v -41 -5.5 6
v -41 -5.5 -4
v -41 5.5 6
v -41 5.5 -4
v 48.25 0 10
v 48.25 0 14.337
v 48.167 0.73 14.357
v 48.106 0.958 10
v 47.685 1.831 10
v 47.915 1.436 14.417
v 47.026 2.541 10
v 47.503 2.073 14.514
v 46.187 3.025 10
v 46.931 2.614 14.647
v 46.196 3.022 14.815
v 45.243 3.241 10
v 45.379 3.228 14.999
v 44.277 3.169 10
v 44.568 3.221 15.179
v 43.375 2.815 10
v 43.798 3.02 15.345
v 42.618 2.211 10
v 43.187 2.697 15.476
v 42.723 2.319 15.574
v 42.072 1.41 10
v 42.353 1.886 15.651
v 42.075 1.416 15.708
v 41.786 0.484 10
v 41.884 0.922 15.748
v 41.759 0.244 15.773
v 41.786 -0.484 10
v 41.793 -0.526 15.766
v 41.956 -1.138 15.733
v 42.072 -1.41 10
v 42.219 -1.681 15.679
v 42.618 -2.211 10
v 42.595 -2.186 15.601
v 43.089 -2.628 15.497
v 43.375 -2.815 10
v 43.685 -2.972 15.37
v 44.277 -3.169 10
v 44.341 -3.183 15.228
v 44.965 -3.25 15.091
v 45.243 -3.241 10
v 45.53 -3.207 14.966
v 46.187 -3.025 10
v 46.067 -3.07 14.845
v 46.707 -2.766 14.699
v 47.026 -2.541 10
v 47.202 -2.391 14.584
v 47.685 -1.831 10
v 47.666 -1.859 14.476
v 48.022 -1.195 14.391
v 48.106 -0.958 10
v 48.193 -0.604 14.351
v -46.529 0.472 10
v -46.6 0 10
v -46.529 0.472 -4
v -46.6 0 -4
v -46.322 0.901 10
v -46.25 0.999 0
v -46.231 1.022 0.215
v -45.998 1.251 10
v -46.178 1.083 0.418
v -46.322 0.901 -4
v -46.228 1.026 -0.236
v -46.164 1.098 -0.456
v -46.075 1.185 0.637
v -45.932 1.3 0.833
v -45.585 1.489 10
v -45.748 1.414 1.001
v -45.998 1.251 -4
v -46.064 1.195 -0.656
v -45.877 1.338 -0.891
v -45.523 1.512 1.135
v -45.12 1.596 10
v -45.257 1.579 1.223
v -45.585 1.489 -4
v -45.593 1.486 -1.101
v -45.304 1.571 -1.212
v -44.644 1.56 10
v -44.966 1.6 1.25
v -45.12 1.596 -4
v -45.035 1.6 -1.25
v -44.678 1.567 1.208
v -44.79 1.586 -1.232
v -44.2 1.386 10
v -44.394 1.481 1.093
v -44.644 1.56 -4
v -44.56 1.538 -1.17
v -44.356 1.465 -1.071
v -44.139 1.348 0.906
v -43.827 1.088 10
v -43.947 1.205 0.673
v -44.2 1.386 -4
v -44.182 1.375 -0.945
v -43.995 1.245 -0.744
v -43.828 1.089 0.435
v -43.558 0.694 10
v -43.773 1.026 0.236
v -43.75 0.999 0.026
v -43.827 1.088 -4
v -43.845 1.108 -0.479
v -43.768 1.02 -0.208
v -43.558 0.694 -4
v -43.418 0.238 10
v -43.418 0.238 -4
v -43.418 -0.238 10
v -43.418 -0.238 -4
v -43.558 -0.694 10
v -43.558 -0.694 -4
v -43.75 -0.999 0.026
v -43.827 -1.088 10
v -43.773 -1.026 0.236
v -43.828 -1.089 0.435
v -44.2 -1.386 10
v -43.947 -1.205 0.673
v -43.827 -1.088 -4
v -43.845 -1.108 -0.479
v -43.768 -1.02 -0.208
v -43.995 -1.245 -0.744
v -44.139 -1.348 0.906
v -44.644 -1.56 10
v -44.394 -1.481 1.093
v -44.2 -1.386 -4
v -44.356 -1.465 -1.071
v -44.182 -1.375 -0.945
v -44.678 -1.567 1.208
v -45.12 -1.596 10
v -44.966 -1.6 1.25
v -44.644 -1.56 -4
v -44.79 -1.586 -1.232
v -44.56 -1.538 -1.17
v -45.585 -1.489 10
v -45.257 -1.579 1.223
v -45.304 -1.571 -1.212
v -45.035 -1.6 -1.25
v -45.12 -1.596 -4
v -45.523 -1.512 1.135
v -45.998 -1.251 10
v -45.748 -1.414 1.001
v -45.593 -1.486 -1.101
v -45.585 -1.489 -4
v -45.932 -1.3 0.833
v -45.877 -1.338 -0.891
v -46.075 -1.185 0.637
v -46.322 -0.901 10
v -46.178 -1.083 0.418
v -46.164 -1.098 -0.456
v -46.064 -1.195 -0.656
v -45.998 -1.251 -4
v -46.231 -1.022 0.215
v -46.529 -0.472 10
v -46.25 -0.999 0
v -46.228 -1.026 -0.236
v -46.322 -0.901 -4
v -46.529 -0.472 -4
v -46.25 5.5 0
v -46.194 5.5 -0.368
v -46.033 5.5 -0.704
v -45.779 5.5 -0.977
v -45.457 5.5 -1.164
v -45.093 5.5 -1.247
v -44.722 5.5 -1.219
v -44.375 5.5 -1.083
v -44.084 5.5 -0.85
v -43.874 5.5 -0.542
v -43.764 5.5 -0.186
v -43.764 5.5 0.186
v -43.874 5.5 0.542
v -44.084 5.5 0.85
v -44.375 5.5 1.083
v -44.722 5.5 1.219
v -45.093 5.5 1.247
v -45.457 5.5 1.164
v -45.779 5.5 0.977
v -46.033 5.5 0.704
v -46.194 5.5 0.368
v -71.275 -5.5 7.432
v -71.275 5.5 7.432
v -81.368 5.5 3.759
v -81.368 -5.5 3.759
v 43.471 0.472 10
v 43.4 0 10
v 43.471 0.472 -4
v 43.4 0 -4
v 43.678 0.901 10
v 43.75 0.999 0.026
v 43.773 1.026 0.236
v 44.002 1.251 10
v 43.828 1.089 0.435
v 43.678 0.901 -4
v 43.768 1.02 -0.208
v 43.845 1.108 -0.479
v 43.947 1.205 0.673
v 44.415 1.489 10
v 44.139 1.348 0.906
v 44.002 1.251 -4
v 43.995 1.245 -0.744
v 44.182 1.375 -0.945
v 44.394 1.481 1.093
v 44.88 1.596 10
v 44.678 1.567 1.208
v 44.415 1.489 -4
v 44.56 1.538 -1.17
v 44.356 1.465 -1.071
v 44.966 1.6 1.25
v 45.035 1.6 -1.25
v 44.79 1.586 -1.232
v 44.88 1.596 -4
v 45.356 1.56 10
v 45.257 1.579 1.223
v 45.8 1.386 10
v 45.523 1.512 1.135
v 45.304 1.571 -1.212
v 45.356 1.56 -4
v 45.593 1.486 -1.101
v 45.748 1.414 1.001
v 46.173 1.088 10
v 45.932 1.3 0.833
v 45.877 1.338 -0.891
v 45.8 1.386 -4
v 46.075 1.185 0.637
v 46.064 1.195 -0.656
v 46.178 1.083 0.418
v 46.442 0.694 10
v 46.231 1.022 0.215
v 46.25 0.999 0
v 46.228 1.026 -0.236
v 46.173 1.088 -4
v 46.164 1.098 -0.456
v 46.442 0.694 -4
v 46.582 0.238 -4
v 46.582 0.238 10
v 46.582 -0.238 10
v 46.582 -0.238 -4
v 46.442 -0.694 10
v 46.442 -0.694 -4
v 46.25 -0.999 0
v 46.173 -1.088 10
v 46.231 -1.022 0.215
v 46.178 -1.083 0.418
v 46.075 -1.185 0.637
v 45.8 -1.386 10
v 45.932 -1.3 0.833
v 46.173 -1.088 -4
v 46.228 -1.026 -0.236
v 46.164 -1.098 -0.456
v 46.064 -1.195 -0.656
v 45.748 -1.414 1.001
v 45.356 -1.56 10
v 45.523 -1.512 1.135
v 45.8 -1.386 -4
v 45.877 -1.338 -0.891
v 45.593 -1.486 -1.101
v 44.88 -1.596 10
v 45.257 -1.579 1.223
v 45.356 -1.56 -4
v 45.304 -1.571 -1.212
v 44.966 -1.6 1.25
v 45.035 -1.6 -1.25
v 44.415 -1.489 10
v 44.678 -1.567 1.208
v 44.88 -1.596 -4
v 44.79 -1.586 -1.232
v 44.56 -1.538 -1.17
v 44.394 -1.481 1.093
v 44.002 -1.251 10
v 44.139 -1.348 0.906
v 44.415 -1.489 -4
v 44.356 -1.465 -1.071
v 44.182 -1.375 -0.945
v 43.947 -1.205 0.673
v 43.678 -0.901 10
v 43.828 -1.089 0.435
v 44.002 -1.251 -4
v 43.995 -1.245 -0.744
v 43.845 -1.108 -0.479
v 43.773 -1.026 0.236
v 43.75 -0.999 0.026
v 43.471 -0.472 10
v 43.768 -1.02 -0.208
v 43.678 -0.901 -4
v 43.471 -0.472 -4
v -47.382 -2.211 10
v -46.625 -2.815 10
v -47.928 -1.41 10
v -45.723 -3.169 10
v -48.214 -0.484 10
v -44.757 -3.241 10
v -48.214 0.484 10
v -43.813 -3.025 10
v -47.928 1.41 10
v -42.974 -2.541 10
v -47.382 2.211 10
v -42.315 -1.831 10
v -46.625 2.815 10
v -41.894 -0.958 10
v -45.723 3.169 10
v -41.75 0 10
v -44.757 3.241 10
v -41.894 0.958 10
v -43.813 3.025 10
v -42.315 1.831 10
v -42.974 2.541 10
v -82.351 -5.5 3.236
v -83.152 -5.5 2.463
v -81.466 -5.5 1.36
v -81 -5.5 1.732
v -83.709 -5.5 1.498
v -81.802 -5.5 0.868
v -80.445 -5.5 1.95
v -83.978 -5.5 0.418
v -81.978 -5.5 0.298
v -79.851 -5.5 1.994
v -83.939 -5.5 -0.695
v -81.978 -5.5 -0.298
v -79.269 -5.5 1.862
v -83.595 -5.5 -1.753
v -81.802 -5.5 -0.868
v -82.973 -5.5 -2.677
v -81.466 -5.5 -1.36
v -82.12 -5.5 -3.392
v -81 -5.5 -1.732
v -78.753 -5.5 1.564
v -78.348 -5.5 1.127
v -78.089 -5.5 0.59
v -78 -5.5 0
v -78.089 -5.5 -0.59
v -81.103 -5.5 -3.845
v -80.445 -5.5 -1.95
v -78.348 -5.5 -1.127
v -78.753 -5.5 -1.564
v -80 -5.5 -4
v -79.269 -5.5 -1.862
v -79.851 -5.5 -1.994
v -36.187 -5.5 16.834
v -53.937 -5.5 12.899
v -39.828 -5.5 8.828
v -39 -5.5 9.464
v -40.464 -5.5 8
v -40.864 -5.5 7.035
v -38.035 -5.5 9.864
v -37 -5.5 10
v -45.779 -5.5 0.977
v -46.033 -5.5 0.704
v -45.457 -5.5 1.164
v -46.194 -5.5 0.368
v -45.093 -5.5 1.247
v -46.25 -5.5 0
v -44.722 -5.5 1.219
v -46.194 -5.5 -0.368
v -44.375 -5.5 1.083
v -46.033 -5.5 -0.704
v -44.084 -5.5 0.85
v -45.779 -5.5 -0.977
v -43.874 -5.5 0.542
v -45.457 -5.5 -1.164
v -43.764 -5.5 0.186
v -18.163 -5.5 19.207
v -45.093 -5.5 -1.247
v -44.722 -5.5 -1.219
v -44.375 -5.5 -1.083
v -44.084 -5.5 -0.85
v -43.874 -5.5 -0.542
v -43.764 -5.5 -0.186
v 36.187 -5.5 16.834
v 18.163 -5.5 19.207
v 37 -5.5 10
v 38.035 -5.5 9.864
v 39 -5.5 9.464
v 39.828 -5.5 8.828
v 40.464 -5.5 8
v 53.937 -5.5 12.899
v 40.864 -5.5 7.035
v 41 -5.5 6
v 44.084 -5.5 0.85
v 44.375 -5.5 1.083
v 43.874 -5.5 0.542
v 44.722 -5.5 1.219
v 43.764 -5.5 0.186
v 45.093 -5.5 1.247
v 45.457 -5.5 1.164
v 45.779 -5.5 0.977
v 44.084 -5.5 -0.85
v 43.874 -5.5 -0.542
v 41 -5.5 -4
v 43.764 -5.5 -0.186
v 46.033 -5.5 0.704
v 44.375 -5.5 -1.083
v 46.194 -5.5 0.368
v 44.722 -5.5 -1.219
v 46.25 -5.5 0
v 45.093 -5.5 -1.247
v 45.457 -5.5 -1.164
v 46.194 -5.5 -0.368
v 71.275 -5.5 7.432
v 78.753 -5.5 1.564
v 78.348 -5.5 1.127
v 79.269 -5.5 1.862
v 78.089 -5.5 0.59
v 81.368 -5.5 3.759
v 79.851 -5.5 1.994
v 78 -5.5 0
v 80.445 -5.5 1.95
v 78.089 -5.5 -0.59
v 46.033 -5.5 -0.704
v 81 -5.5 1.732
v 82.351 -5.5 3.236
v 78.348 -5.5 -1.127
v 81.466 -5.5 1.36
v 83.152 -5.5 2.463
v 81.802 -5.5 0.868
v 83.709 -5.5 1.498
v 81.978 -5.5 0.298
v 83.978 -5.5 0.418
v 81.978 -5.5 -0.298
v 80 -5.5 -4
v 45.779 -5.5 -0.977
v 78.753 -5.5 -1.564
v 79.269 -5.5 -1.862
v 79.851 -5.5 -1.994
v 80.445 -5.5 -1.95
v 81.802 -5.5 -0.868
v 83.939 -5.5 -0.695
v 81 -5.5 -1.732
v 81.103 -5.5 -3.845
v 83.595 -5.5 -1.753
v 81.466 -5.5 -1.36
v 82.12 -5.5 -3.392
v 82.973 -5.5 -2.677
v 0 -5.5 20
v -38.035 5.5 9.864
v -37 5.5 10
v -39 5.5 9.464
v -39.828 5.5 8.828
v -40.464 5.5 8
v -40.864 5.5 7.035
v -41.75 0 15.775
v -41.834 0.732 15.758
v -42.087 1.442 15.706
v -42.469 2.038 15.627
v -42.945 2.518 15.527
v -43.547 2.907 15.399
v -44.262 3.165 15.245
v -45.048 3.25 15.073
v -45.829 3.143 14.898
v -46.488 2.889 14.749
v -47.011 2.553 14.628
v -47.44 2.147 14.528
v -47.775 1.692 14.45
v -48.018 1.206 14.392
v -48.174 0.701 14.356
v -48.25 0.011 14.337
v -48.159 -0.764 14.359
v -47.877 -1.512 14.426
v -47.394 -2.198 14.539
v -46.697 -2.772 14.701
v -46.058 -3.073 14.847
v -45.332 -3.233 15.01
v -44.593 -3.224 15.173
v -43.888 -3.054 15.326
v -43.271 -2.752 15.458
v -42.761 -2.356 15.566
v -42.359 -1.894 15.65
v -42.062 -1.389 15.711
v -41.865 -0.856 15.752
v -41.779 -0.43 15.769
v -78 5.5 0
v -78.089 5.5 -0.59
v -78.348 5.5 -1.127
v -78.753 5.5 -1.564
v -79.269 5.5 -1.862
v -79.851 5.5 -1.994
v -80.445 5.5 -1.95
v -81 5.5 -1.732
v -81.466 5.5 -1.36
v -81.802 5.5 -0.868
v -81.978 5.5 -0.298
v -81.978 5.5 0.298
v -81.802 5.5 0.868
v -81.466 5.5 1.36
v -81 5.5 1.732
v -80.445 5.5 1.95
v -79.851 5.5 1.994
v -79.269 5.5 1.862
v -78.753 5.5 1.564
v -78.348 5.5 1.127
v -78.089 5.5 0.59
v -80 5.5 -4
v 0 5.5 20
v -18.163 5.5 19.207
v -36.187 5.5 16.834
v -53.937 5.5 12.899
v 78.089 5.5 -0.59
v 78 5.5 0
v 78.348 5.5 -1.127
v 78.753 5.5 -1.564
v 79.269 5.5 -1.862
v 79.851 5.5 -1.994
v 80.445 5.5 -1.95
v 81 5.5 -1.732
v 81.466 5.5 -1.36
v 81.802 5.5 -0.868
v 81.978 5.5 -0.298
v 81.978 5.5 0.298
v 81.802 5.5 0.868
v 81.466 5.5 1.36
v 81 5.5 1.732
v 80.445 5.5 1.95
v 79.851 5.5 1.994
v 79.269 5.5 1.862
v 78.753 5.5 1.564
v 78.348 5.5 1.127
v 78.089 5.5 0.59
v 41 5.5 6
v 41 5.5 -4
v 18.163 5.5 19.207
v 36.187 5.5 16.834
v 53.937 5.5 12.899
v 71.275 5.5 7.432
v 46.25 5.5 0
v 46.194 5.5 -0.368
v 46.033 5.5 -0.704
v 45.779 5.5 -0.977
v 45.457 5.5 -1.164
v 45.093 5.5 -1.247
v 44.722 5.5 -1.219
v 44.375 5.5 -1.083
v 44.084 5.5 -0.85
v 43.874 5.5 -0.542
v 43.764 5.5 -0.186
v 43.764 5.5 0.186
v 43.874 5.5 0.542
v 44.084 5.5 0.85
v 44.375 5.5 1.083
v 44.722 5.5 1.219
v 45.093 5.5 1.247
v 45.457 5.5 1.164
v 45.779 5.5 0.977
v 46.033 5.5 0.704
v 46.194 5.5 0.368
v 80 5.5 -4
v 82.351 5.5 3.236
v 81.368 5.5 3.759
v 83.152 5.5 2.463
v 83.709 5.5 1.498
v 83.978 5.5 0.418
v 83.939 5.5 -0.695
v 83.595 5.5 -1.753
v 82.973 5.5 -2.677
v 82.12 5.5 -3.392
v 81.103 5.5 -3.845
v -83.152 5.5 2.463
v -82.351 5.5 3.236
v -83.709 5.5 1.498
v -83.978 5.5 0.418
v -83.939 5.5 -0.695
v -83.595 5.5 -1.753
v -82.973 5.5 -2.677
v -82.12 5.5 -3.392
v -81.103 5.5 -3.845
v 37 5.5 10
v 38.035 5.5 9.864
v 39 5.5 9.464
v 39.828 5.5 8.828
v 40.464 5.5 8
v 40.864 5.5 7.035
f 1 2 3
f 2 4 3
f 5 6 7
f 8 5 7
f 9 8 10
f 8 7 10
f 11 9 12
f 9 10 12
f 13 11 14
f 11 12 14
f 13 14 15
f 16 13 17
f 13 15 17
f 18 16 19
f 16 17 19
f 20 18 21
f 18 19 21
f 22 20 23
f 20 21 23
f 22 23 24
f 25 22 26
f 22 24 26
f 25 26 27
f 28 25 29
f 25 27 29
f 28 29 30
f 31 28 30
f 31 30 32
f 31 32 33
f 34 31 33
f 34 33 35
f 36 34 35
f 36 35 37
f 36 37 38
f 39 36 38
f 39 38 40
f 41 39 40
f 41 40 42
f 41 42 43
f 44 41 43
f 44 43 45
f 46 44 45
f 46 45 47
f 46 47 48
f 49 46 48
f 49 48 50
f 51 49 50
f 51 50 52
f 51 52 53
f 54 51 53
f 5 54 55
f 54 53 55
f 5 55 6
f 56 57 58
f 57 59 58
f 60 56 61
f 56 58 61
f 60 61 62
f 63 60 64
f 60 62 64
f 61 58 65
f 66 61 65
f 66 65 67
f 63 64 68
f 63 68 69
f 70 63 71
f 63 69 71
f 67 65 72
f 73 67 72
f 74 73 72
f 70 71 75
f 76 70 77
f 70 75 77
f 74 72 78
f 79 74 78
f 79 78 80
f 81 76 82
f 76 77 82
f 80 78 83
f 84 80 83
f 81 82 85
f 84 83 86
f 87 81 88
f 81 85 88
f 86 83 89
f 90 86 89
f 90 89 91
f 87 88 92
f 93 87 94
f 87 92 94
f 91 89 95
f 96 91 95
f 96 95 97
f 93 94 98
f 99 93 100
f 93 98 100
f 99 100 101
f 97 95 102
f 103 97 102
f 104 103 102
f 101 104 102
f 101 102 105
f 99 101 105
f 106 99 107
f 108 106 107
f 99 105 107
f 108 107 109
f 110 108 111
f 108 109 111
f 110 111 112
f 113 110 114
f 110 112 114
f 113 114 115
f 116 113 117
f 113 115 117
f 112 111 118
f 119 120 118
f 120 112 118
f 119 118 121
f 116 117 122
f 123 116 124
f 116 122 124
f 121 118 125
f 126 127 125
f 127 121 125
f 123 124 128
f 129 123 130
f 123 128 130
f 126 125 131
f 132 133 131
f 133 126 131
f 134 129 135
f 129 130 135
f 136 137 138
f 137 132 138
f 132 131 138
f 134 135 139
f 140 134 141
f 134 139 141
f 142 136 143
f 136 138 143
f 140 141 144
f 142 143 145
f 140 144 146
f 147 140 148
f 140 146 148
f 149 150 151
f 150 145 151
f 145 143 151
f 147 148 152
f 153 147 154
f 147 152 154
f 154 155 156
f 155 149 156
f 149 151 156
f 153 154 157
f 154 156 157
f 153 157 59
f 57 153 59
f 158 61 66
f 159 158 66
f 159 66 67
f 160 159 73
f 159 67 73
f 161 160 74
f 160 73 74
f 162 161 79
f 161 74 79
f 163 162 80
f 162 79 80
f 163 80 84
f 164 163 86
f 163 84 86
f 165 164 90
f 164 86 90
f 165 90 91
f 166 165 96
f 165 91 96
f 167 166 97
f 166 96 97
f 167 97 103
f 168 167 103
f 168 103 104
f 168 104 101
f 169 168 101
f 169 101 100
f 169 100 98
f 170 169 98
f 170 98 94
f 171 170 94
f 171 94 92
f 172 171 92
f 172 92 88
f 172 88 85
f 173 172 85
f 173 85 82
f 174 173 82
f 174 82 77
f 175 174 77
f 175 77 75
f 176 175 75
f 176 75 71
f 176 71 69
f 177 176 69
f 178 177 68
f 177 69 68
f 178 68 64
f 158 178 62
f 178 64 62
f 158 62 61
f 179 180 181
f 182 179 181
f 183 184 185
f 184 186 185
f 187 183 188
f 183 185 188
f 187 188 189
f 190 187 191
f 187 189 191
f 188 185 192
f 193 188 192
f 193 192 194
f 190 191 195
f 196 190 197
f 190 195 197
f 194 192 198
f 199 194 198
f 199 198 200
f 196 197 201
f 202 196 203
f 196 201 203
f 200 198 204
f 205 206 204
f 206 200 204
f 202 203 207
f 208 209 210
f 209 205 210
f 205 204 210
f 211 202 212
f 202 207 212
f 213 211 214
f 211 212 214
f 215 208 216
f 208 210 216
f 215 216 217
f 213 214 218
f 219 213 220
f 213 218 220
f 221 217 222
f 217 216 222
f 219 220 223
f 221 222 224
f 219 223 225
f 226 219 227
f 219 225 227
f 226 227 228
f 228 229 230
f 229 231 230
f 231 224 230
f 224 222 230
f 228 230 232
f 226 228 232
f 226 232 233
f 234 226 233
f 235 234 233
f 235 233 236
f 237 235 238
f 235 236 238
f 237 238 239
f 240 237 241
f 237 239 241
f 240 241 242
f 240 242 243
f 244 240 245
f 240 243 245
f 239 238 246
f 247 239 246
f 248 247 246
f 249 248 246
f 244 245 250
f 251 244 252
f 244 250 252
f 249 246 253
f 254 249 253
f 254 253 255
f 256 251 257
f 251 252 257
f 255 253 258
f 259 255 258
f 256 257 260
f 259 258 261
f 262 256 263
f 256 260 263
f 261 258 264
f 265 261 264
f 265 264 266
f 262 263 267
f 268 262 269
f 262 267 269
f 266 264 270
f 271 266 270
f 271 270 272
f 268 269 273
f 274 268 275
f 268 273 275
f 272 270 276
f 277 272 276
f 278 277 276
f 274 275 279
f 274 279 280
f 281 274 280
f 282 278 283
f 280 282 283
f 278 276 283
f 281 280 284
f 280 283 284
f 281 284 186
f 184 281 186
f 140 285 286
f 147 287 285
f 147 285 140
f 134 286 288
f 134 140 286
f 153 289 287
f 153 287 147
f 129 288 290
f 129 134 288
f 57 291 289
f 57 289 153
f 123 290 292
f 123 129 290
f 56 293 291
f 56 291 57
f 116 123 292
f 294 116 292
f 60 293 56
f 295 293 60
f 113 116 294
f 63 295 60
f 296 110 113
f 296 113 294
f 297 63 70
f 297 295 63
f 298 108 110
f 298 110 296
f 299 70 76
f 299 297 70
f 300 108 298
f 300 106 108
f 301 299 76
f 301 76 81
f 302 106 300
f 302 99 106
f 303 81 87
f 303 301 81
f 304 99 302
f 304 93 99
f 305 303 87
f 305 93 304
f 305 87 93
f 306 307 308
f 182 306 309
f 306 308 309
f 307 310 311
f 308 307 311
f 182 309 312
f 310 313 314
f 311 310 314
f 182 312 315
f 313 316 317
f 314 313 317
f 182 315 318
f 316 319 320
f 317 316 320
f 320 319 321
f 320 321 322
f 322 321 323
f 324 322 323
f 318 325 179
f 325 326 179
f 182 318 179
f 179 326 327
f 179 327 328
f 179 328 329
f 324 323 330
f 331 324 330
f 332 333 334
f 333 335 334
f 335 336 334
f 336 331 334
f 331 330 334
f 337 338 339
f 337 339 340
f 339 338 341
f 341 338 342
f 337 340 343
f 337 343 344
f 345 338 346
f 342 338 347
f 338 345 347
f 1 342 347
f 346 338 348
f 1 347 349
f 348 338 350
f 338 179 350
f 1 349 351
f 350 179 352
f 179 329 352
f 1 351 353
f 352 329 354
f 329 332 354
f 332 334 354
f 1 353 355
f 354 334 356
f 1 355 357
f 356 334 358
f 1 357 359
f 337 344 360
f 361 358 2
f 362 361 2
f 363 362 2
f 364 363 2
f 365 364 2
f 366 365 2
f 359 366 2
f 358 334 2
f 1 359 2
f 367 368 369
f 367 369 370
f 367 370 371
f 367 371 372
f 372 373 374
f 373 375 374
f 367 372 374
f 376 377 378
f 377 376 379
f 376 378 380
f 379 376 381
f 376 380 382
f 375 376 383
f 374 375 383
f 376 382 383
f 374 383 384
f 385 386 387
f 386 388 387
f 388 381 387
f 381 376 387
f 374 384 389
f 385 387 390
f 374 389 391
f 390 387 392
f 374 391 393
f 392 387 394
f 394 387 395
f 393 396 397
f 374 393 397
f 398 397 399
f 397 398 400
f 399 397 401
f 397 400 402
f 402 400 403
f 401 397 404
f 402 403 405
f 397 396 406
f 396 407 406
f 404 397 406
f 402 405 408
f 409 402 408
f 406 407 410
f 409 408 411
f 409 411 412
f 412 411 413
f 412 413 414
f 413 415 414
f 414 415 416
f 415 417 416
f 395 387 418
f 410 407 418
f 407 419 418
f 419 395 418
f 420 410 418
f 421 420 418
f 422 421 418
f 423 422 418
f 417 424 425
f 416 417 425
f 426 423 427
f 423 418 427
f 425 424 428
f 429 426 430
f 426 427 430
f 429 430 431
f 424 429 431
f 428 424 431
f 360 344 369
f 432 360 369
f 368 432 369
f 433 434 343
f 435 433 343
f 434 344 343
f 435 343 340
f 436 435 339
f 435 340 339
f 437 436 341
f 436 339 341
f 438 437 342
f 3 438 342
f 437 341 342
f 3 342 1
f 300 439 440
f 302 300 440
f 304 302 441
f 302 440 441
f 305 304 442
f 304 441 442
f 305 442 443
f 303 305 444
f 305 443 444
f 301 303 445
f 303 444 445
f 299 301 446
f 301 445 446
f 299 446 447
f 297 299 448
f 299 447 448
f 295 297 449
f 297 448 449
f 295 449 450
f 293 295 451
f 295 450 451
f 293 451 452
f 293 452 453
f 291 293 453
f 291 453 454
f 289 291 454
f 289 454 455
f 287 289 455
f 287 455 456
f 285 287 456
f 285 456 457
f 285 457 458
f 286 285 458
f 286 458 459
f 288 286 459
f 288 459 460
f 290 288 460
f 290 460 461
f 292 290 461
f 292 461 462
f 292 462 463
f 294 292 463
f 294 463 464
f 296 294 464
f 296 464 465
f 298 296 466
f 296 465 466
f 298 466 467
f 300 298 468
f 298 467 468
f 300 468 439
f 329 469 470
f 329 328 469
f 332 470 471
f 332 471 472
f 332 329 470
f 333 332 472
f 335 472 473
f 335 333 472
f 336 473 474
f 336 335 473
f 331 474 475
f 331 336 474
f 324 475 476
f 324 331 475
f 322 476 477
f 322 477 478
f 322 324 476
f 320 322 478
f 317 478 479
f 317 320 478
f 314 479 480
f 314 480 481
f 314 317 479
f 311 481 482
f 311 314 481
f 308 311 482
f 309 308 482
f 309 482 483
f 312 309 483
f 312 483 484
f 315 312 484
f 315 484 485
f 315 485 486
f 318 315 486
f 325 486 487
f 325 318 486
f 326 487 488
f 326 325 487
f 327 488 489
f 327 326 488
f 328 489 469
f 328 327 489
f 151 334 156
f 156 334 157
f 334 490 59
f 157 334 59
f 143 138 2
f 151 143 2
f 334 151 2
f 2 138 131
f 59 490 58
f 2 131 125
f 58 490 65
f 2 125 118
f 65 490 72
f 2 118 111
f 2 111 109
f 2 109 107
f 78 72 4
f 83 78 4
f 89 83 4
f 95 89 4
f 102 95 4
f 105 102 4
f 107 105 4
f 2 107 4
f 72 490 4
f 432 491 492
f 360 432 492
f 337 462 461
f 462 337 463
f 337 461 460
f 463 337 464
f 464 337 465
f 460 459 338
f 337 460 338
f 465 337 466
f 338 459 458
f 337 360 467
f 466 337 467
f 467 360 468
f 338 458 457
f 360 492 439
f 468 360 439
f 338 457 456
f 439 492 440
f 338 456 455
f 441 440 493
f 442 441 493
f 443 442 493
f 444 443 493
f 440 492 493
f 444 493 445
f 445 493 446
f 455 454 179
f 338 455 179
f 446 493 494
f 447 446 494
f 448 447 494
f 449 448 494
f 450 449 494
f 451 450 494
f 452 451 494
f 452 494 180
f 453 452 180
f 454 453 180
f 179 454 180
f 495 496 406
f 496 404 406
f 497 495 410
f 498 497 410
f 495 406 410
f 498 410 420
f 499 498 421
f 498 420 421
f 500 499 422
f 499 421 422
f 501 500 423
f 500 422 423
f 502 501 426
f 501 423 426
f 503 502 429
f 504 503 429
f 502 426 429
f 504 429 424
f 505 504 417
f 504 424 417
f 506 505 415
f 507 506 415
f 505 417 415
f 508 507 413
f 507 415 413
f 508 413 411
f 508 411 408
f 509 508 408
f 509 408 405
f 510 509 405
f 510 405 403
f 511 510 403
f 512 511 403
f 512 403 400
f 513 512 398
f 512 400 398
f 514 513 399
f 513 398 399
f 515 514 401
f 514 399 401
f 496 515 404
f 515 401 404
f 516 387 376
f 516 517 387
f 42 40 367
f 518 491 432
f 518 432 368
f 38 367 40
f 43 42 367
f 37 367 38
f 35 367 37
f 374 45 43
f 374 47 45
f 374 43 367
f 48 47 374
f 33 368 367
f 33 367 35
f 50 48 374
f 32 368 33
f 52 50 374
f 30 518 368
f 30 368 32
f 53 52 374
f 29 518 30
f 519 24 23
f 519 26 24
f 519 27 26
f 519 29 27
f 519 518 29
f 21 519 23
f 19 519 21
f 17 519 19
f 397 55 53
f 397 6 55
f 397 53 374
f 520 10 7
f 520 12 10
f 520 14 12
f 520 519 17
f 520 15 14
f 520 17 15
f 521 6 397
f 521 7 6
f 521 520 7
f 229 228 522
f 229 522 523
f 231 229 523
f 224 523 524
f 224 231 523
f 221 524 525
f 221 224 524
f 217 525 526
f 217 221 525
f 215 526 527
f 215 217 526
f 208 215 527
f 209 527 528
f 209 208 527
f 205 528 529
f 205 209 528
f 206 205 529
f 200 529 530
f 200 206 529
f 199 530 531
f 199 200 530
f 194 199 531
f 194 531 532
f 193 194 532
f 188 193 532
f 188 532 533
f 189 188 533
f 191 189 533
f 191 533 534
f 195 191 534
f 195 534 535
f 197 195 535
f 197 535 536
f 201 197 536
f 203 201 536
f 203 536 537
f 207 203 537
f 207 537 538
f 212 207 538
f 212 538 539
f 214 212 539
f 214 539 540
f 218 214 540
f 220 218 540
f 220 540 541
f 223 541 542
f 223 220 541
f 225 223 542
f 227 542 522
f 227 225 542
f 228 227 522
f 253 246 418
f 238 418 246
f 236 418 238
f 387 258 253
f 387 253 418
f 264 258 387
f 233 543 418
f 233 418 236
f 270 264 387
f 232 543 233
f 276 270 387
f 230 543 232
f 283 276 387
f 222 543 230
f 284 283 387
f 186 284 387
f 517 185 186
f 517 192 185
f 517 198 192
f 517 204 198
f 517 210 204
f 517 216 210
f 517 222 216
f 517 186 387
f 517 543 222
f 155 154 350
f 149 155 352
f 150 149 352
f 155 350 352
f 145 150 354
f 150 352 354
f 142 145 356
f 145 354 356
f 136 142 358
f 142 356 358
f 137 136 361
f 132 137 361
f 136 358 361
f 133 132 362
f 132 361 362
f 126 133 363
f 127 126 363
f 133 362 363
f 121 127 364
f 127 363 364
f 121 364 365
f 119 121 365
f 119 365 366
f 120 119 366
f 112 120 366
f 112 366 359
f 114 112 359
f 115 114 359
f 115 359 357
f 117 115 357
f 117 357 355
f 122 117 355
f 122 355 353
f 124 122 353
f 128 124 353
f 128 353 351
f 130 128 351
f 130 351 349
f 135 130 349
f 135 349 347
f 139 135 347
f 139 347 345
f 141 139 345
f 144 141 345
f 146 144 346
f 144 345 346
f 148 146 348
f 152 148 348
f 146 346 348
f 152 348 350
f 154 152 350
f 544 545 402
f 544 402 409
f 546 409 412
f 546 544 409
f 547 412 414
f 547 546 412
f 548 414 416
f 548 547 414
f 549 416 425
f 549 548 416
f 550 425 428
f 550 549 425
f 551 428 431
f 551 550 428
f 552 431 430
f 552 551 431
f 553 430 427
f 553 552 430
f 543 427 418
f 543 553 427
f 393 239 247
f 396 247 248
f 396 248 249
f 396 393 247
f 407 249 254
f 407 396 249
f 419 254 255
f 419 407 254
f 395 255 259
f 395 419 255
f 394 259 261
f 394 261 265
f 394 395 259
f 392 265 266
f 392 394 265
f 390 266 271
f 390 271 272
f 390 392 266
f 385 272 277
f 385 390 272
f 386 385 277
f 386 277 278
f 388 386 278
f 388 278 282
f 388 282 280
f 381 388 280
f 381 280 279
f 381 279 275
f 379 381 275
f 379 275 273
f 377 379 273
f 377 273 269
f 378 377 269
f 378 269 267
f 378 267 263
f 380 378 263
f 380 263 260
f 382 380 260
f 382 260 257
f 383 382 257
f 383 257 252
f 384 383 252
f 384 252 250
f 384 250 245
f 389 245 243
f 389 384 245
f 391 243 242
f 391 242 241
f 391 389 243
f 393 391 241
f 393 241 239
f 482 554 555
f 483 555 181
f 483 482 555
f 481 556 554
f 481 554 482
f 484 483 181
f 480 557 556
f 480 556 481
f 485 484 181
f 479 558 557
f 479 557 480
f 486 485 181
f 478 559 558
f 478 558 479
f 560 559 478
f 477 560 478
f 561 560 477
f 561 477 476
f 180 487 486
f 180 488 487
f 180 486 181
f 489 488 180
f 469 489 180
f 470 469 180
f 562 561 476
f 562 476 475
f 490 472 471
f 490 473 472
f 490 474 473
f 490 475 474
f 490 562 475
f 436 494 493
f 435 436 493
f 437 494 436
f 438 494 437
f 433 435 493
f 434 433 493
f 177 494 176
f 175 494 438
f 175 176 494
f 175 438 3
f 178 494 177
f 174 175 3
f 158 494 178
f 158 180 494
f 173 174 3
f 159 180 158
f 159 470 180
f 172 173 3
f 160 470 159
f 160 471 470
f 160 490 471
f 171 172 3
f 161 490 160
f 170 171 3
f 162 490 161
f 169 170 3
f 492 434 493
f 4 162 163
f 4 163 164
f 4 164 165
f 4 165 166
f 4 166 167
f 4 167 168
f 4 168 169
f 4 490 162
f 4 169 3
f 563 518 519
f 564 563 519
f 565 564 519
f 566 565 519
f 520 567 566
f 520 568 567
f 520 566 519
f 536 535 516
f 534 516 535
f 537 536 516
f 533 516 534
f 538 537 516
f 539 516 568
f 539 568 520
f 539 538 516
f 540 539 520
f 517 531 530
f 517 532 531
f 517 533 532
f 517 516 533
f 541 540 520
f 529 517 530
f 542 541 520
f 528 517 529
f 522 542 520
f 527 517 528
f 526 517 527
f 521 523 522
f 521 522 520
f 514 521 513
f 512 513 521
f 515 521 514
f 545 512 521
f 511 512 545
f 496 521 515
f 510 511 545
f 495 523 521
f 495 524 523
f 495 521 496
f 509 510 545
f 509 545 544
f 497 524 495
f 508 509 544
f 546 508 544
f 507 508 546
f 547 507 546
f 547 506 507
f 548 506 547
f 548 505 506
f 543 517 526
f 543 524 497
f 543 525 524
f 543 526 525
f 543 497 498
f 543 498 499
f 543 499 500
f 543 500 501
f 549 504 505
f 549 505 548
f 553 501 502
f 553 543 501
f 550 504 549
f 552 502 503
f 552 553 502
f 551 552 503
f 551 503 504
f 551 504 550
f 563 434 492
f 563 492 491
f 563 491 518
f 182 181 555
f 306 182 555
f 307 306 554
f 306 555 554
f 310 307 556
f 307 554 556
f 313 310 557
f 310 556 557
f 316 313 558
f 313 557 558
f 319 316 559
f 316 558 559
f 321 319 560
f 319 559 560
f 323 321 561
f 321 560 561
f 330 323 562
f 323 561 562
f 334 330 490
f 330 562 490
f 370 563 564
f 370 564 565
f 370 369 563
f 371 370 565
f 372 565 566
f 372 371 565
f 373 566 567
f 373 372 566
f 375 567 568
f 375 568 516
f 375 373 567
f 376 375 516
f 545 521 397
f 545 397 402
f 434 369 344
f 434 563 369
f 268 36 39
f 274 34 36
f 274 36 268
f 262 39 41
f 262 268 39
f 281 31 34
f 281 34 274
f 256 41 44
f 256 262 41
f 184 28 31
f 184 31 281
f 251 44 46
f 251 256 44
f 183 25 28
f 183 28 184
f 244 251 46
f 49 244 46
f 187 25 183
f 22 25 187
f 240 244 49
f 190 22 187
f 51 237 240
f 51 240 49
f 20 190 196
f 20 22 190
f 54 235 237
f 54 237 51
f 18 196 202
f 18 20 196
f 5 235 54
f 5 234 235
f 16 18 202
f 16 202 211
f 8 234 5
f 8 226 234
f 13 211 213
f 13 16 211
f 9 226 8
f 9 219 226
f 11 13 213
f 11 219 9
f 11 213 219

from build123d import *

# Parameters (mm, degrees)
SKIZZE1_R                                            = 2
AUFSATZ_LINEAR_AUSTRAGEN1_DEPTH                      = 5.5
VERRUNDUNG1_R                                        = 4
M3_GEWINDEBOHRUNG1_D                                 = 2.5
STIRNSENKUNG_F_R_M3_ZYLINDERSCHRAUBE_MIT_D           = 3.2
STIRNSENKUNG_F_R_M3_ZYLINDERSCHRAUBE_MIT_CBORE_D     = 6.5
STIRNSENKUNG_F_R_M3_ZYLINDERSCHRAUBE_MIT_CBORE_DEPTH = 10


with BuildPart() as part:
    # Skizze1 → Aufsatz-Linear austragen1 (new body, symmetric)
    with BuildSketch(Plane(origin=(0, 0, 0), x_dir=(1, 0, 0), z_dir=(0, 1, 0))):
        with BuildLine():
            Line((-80, 4), (-45, 4))
            Line((-45, 4), (-41, 4))
            Line((-41, 4), (-41, -10))
            Line((-41, -10), (0, -10))
            Line((0, -10), (0, -20))
            ThreePointArc((0, -20), (-36.187419929, -16.834010994), (-71.275303416, -7.43224095))
            Line((-71.275303416, -7.43224095), (-81.368080573, -3.758770483))
            ThreePointArc((-81.368080573, -3.758770483), (-83.939231012, 0.694592711), (-80, 4))
        make_face()
        with Locations((-80, 0)):
            Circle(SKIZZE1_R, mode=Mode.SUBTRACT)
    extrude(amount=AUFSATZ_LINEAR_AUSTRAGEN1_DEPTH, both=True)

    # Verrundung1
    verrundung1_edges = [part.edges().sort_by_distance(p)[0] for p in [
        (-41, 0, 10),
    ]]
    fillet(verrundung1_edges, radius=VERRUNDUNG1_R)

    # M3 Gewindebohrung1 (through all)
    with Locations(Plane(origin=(0, 5.5, 0), x_dir=(1, 0, 0), z_dir=(0, 1, 0))):
        with Locations((-45, 0)):
            Hole(M3_GEWINDEBOHRUNG1_D / 2)

    # Spiegeln3: part across plane


with BuildPart() as part_1:
    add(part.part)
    add(part.part.mirror(Plane(origin=(0, 0, 0), x_dir=(0, 0, 1), z_dir=(1, 0, 0))))

    # Stirnsenkung für  M3 Zylinderschraube mit Schlitz/Kreuzschlitz1 (through all)
    with Locations(Plane.XY.offset(20)):
        with Locations((-45, 0), (45, 0)):
            CounterBoreHole(STIRNSENKUNG_F_R_M3_ZYLINDERSCHRAUBE_MIT_D / 2, STIRNSENKUNG_F_R_M3_ZYLINDERSCHRAUBE_MIT_CBORE_D / 2, STIRNSENKUNG_F_R_M3_ZYLINDERSCHRAUBE_MIT_CBORE_DEPTH)


solid = part_1.part
